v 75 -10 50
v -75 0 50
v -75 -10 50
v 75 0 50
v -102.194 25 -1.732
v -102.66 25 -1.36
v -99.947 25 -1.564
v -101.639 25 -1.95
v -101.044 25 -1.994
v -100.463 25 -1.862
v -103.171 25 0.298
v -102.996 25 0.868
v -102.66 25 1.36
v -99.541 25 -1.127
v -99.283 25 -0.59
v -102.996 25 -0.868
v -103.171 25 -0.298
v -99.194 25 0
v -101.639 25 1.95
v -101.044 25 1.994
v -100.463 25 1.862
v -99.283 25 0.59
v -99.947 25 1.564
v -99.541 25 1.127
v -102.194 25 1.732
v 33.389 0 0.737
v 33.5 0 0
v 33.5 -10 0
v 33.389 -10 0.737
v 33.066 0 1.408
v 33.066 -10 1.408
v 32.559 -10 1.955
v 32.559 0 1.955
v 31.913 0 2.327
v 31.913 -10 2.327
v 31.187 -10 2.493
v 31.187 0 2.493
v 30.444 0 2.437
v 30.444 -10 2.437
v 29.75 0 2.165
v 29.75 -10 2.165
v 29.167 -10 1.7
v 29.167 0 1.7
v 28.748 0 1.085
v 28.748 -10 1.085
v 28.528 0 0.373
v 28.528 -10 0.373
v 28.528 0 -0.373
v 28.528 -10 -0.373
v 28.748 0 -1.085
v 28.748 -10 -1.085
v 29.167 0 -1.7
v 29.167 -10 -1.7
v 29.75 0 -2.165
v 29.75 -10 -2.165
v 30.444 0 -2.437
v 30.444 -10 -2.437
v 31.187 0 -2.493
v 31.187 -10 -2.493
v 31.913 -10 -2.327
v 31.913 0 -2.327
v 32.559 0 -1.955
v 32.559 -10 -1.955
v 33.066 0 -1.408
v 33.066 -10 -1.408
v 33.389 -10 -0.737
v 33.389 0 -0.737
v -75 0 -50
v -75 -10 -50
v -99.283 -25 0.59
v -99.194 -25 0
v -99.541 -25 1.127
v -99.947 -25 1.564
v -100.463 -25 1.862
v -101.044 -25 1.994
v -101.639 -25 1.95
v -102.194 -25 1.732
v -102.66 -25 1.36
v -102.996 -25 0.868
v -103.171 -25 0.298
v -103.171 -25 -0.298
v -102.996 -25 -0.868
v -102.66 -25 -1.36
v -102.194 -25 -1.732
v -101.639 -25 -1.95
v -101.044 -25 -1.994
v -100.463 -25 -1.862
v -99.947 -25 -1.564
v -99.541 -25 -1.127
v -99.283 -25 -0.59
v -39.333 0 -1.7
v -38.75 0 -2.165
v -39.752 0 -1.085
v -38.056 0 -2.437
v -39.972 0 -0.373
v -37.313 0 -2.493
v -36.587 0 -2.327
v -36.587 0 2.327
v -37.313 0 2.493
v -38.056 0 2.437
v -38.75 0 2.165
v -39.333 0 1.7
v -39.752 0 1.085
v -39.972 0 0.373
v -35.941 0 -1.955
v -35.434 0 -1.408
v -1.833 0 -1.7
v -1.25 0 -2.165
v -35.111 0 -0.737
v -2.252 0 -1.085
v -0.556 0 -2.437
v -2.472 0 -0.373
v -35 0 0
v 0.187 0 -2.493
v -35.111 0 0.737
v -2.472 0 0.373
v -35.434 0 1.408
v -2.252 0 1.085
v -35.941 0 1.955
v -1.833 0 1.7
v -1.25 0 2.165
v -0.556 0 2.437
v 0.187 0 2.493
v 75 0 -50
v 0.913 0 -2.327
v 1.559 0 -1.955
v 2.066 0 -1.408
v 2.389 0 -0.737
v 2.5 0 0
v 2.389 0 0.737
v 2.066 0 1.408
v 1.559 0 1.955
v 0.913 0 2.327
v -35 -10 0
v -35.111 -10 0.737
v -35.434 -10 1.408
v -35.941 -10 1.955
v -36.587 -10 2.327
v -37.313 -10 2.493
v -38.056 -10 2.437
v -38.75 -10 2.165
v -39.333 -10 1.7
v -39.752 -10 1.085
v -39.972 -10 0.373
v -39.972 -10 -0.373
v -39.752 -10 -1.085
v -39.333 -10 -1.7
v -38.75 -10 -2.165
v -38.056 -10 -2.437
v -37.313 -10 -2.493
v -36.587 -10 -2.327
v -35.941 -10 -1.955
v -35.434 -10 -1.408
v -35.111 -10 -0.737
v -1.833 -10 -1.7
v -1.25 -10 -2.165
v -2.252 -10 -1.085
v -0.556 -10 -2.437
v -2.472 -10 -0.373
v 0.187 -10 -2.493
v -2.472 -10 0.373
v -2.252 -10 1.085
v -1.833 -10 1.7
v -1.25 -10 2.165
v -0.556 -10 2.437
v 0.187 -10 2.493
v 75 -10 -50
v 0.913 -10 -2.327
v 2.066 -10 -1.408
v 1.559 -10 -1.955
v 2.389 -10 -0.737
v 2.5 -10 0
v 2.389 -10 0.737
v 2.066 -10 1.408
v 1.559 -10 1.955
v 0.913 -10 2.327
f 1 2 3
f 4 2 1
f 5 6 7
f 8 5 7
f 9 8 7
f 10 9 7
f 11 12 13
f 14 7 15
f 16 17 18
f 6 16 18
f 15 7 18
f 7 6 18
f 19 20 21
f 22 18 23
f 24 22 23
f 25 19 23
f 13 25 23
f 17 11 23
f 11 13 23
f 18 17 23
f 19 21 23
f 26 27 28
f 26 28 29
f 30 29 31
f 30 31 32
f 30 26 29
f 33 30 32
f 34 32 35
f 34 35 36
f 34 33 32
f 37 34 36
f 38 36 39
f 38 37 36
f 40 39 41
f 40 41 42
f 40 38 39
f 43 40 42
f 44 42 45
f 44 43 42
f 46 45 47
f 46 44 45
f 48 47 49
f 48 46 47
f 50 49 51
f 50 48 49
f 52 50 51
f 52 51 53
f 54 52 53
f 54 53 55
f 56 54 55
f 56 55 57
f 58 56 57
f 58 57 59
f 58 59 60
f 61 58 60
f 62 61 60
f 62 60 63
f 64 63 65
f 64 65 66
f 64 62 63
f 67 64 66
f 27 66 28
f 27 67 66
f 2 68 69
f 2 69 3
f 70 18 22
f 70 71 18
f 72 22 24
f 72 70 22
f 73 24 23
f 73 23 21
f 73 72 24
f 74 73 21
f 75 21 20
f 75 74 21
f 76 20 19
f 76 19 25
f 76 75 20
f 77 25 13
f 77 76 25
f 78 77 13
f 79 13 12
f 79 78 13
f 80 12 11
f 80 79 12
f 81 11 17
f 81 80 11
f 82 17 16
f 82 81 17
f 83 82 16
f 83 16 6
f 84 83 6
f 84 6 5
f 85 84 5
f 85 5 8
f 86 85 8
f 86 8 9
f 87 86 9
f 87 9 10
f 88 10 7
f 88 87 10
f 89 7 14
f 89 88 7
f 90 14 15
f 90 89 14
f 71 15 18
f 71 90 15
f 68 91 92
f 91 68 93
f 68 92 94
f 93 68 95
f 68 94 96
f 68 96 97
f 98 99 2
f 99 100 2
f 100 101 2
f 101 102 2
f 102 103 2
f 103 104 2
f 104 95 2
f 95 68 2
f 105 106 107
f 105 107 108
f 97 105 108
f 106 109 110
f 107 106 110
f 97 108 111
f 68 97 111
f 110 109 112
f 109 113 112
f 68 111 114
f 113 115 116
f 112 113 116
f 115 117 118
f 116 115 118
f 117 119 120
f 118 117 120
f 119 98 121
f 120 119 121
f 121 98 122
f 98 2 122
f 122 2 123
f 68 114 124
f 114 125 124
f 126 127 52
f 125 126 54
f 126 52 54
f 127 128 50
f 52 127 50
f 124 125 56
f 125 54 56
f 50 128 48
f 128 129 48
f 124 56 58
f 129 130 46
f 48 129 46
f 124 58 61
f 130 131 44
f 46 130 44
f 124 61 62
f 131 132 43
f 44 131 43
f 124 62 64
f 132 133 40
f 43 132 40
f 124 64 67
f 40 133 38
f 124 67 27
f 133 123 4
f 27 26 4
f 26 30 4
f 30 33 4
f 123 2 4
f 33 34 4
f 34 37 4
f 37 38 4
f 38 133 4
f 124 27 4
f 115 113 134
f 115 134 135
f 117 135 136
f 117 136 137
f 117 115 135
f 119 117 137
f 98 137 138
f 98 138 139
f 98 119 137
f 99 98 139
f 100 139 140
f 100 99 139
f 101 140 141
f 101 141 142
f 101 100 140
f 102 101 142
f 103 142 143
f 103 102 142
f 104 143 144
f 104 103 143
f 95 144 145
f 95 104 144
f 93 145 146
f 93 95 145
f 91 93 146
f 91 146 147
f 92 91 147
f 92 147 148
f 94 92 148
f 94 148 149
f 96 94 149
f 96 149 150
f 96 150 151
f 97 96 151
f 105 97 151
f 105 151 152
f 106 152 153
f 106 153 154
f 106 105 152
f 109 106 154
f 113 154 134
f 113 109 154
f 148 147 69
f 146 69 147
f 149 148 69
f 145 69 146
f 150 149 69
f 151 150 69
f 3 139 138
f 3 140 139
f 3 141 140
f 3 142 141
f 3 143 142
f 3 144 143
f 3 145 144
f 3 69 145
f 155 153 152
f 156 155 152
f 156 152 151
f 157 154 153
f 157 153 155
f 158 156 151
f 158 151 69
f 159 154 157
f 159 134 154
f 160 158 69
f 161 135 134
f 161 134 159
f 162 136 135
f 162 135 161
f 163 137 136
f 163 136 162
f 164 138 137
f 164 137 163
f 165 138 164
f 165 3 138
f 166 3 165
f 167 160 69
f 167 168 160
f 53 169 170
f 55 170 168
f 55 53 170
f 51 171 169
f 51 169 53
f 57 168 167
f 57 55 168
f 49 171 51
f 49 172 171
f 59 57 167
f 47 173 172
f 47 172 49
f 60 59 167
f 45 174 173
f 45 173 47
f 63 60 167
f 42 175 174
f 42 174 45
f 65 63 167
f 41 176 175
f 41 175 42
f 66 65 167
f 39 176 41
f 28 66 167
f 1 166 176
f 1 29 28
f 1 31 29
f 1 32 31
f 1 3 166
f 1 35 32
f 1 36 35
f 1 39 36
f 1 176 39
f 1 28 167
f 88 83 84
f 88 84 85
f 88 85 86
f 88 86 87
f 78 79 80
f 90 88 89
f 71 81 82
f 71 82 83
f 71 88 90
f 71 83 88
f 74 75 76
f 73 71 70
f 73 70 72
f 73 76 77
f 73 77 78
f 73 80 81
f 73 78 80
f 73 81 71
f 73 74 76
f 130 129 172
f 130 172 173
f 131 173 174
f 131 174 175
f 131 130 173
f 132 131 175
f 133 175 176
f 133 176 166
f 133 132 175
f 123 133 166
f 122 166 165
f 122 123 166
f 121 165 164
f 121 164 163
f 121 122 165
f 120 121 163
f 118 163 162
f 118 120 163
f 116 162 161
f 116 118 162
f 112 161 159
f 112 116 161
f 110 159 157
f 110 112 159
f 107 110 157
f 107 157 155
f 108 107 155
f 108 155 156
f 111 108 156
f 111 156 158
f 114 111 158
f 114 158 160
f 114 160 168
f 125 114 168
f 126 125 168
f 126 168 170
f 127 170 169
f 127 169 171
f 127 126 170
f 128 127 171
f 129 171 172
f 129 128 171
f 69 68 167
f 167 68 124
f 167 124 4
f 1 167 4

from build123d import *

# Parameters (mm, degrees)
F0_W     = 150
F0_H     = 100
F0_R     = 2.5
F1_DEPTH = 10
F2_R     = 2
F3_DEPTH = 25


with BuildPart() as f1:
    # F0 (on Front) → F1 (new body)
    with BuildSketch(Plane.XZ):
        Rectangle(F0_W, F0_H)
        with Locations((-37.5, 0)):
            Circle(F0_R, mode=Mode.SUBTRACT)
        Circle(F0_R, mode=Mode.SUBTRACT)
        with Locations((31, 0)):
            Circle(F0_R, mode=Mode.SUBTRACT)
    extrude(amount=F1_DEPTH)


with BuildPart() as f3:
    # F2 (on Front) → F3 (new body, symmetric)
    with BuildSketch(Plane.XZ):
        with Locations((-101.193815, 0)):
            Circle(F2_R)
    extrude(amount=F3_DEPTH, both=True)


solid = Compound([f1.part, f3.part])
